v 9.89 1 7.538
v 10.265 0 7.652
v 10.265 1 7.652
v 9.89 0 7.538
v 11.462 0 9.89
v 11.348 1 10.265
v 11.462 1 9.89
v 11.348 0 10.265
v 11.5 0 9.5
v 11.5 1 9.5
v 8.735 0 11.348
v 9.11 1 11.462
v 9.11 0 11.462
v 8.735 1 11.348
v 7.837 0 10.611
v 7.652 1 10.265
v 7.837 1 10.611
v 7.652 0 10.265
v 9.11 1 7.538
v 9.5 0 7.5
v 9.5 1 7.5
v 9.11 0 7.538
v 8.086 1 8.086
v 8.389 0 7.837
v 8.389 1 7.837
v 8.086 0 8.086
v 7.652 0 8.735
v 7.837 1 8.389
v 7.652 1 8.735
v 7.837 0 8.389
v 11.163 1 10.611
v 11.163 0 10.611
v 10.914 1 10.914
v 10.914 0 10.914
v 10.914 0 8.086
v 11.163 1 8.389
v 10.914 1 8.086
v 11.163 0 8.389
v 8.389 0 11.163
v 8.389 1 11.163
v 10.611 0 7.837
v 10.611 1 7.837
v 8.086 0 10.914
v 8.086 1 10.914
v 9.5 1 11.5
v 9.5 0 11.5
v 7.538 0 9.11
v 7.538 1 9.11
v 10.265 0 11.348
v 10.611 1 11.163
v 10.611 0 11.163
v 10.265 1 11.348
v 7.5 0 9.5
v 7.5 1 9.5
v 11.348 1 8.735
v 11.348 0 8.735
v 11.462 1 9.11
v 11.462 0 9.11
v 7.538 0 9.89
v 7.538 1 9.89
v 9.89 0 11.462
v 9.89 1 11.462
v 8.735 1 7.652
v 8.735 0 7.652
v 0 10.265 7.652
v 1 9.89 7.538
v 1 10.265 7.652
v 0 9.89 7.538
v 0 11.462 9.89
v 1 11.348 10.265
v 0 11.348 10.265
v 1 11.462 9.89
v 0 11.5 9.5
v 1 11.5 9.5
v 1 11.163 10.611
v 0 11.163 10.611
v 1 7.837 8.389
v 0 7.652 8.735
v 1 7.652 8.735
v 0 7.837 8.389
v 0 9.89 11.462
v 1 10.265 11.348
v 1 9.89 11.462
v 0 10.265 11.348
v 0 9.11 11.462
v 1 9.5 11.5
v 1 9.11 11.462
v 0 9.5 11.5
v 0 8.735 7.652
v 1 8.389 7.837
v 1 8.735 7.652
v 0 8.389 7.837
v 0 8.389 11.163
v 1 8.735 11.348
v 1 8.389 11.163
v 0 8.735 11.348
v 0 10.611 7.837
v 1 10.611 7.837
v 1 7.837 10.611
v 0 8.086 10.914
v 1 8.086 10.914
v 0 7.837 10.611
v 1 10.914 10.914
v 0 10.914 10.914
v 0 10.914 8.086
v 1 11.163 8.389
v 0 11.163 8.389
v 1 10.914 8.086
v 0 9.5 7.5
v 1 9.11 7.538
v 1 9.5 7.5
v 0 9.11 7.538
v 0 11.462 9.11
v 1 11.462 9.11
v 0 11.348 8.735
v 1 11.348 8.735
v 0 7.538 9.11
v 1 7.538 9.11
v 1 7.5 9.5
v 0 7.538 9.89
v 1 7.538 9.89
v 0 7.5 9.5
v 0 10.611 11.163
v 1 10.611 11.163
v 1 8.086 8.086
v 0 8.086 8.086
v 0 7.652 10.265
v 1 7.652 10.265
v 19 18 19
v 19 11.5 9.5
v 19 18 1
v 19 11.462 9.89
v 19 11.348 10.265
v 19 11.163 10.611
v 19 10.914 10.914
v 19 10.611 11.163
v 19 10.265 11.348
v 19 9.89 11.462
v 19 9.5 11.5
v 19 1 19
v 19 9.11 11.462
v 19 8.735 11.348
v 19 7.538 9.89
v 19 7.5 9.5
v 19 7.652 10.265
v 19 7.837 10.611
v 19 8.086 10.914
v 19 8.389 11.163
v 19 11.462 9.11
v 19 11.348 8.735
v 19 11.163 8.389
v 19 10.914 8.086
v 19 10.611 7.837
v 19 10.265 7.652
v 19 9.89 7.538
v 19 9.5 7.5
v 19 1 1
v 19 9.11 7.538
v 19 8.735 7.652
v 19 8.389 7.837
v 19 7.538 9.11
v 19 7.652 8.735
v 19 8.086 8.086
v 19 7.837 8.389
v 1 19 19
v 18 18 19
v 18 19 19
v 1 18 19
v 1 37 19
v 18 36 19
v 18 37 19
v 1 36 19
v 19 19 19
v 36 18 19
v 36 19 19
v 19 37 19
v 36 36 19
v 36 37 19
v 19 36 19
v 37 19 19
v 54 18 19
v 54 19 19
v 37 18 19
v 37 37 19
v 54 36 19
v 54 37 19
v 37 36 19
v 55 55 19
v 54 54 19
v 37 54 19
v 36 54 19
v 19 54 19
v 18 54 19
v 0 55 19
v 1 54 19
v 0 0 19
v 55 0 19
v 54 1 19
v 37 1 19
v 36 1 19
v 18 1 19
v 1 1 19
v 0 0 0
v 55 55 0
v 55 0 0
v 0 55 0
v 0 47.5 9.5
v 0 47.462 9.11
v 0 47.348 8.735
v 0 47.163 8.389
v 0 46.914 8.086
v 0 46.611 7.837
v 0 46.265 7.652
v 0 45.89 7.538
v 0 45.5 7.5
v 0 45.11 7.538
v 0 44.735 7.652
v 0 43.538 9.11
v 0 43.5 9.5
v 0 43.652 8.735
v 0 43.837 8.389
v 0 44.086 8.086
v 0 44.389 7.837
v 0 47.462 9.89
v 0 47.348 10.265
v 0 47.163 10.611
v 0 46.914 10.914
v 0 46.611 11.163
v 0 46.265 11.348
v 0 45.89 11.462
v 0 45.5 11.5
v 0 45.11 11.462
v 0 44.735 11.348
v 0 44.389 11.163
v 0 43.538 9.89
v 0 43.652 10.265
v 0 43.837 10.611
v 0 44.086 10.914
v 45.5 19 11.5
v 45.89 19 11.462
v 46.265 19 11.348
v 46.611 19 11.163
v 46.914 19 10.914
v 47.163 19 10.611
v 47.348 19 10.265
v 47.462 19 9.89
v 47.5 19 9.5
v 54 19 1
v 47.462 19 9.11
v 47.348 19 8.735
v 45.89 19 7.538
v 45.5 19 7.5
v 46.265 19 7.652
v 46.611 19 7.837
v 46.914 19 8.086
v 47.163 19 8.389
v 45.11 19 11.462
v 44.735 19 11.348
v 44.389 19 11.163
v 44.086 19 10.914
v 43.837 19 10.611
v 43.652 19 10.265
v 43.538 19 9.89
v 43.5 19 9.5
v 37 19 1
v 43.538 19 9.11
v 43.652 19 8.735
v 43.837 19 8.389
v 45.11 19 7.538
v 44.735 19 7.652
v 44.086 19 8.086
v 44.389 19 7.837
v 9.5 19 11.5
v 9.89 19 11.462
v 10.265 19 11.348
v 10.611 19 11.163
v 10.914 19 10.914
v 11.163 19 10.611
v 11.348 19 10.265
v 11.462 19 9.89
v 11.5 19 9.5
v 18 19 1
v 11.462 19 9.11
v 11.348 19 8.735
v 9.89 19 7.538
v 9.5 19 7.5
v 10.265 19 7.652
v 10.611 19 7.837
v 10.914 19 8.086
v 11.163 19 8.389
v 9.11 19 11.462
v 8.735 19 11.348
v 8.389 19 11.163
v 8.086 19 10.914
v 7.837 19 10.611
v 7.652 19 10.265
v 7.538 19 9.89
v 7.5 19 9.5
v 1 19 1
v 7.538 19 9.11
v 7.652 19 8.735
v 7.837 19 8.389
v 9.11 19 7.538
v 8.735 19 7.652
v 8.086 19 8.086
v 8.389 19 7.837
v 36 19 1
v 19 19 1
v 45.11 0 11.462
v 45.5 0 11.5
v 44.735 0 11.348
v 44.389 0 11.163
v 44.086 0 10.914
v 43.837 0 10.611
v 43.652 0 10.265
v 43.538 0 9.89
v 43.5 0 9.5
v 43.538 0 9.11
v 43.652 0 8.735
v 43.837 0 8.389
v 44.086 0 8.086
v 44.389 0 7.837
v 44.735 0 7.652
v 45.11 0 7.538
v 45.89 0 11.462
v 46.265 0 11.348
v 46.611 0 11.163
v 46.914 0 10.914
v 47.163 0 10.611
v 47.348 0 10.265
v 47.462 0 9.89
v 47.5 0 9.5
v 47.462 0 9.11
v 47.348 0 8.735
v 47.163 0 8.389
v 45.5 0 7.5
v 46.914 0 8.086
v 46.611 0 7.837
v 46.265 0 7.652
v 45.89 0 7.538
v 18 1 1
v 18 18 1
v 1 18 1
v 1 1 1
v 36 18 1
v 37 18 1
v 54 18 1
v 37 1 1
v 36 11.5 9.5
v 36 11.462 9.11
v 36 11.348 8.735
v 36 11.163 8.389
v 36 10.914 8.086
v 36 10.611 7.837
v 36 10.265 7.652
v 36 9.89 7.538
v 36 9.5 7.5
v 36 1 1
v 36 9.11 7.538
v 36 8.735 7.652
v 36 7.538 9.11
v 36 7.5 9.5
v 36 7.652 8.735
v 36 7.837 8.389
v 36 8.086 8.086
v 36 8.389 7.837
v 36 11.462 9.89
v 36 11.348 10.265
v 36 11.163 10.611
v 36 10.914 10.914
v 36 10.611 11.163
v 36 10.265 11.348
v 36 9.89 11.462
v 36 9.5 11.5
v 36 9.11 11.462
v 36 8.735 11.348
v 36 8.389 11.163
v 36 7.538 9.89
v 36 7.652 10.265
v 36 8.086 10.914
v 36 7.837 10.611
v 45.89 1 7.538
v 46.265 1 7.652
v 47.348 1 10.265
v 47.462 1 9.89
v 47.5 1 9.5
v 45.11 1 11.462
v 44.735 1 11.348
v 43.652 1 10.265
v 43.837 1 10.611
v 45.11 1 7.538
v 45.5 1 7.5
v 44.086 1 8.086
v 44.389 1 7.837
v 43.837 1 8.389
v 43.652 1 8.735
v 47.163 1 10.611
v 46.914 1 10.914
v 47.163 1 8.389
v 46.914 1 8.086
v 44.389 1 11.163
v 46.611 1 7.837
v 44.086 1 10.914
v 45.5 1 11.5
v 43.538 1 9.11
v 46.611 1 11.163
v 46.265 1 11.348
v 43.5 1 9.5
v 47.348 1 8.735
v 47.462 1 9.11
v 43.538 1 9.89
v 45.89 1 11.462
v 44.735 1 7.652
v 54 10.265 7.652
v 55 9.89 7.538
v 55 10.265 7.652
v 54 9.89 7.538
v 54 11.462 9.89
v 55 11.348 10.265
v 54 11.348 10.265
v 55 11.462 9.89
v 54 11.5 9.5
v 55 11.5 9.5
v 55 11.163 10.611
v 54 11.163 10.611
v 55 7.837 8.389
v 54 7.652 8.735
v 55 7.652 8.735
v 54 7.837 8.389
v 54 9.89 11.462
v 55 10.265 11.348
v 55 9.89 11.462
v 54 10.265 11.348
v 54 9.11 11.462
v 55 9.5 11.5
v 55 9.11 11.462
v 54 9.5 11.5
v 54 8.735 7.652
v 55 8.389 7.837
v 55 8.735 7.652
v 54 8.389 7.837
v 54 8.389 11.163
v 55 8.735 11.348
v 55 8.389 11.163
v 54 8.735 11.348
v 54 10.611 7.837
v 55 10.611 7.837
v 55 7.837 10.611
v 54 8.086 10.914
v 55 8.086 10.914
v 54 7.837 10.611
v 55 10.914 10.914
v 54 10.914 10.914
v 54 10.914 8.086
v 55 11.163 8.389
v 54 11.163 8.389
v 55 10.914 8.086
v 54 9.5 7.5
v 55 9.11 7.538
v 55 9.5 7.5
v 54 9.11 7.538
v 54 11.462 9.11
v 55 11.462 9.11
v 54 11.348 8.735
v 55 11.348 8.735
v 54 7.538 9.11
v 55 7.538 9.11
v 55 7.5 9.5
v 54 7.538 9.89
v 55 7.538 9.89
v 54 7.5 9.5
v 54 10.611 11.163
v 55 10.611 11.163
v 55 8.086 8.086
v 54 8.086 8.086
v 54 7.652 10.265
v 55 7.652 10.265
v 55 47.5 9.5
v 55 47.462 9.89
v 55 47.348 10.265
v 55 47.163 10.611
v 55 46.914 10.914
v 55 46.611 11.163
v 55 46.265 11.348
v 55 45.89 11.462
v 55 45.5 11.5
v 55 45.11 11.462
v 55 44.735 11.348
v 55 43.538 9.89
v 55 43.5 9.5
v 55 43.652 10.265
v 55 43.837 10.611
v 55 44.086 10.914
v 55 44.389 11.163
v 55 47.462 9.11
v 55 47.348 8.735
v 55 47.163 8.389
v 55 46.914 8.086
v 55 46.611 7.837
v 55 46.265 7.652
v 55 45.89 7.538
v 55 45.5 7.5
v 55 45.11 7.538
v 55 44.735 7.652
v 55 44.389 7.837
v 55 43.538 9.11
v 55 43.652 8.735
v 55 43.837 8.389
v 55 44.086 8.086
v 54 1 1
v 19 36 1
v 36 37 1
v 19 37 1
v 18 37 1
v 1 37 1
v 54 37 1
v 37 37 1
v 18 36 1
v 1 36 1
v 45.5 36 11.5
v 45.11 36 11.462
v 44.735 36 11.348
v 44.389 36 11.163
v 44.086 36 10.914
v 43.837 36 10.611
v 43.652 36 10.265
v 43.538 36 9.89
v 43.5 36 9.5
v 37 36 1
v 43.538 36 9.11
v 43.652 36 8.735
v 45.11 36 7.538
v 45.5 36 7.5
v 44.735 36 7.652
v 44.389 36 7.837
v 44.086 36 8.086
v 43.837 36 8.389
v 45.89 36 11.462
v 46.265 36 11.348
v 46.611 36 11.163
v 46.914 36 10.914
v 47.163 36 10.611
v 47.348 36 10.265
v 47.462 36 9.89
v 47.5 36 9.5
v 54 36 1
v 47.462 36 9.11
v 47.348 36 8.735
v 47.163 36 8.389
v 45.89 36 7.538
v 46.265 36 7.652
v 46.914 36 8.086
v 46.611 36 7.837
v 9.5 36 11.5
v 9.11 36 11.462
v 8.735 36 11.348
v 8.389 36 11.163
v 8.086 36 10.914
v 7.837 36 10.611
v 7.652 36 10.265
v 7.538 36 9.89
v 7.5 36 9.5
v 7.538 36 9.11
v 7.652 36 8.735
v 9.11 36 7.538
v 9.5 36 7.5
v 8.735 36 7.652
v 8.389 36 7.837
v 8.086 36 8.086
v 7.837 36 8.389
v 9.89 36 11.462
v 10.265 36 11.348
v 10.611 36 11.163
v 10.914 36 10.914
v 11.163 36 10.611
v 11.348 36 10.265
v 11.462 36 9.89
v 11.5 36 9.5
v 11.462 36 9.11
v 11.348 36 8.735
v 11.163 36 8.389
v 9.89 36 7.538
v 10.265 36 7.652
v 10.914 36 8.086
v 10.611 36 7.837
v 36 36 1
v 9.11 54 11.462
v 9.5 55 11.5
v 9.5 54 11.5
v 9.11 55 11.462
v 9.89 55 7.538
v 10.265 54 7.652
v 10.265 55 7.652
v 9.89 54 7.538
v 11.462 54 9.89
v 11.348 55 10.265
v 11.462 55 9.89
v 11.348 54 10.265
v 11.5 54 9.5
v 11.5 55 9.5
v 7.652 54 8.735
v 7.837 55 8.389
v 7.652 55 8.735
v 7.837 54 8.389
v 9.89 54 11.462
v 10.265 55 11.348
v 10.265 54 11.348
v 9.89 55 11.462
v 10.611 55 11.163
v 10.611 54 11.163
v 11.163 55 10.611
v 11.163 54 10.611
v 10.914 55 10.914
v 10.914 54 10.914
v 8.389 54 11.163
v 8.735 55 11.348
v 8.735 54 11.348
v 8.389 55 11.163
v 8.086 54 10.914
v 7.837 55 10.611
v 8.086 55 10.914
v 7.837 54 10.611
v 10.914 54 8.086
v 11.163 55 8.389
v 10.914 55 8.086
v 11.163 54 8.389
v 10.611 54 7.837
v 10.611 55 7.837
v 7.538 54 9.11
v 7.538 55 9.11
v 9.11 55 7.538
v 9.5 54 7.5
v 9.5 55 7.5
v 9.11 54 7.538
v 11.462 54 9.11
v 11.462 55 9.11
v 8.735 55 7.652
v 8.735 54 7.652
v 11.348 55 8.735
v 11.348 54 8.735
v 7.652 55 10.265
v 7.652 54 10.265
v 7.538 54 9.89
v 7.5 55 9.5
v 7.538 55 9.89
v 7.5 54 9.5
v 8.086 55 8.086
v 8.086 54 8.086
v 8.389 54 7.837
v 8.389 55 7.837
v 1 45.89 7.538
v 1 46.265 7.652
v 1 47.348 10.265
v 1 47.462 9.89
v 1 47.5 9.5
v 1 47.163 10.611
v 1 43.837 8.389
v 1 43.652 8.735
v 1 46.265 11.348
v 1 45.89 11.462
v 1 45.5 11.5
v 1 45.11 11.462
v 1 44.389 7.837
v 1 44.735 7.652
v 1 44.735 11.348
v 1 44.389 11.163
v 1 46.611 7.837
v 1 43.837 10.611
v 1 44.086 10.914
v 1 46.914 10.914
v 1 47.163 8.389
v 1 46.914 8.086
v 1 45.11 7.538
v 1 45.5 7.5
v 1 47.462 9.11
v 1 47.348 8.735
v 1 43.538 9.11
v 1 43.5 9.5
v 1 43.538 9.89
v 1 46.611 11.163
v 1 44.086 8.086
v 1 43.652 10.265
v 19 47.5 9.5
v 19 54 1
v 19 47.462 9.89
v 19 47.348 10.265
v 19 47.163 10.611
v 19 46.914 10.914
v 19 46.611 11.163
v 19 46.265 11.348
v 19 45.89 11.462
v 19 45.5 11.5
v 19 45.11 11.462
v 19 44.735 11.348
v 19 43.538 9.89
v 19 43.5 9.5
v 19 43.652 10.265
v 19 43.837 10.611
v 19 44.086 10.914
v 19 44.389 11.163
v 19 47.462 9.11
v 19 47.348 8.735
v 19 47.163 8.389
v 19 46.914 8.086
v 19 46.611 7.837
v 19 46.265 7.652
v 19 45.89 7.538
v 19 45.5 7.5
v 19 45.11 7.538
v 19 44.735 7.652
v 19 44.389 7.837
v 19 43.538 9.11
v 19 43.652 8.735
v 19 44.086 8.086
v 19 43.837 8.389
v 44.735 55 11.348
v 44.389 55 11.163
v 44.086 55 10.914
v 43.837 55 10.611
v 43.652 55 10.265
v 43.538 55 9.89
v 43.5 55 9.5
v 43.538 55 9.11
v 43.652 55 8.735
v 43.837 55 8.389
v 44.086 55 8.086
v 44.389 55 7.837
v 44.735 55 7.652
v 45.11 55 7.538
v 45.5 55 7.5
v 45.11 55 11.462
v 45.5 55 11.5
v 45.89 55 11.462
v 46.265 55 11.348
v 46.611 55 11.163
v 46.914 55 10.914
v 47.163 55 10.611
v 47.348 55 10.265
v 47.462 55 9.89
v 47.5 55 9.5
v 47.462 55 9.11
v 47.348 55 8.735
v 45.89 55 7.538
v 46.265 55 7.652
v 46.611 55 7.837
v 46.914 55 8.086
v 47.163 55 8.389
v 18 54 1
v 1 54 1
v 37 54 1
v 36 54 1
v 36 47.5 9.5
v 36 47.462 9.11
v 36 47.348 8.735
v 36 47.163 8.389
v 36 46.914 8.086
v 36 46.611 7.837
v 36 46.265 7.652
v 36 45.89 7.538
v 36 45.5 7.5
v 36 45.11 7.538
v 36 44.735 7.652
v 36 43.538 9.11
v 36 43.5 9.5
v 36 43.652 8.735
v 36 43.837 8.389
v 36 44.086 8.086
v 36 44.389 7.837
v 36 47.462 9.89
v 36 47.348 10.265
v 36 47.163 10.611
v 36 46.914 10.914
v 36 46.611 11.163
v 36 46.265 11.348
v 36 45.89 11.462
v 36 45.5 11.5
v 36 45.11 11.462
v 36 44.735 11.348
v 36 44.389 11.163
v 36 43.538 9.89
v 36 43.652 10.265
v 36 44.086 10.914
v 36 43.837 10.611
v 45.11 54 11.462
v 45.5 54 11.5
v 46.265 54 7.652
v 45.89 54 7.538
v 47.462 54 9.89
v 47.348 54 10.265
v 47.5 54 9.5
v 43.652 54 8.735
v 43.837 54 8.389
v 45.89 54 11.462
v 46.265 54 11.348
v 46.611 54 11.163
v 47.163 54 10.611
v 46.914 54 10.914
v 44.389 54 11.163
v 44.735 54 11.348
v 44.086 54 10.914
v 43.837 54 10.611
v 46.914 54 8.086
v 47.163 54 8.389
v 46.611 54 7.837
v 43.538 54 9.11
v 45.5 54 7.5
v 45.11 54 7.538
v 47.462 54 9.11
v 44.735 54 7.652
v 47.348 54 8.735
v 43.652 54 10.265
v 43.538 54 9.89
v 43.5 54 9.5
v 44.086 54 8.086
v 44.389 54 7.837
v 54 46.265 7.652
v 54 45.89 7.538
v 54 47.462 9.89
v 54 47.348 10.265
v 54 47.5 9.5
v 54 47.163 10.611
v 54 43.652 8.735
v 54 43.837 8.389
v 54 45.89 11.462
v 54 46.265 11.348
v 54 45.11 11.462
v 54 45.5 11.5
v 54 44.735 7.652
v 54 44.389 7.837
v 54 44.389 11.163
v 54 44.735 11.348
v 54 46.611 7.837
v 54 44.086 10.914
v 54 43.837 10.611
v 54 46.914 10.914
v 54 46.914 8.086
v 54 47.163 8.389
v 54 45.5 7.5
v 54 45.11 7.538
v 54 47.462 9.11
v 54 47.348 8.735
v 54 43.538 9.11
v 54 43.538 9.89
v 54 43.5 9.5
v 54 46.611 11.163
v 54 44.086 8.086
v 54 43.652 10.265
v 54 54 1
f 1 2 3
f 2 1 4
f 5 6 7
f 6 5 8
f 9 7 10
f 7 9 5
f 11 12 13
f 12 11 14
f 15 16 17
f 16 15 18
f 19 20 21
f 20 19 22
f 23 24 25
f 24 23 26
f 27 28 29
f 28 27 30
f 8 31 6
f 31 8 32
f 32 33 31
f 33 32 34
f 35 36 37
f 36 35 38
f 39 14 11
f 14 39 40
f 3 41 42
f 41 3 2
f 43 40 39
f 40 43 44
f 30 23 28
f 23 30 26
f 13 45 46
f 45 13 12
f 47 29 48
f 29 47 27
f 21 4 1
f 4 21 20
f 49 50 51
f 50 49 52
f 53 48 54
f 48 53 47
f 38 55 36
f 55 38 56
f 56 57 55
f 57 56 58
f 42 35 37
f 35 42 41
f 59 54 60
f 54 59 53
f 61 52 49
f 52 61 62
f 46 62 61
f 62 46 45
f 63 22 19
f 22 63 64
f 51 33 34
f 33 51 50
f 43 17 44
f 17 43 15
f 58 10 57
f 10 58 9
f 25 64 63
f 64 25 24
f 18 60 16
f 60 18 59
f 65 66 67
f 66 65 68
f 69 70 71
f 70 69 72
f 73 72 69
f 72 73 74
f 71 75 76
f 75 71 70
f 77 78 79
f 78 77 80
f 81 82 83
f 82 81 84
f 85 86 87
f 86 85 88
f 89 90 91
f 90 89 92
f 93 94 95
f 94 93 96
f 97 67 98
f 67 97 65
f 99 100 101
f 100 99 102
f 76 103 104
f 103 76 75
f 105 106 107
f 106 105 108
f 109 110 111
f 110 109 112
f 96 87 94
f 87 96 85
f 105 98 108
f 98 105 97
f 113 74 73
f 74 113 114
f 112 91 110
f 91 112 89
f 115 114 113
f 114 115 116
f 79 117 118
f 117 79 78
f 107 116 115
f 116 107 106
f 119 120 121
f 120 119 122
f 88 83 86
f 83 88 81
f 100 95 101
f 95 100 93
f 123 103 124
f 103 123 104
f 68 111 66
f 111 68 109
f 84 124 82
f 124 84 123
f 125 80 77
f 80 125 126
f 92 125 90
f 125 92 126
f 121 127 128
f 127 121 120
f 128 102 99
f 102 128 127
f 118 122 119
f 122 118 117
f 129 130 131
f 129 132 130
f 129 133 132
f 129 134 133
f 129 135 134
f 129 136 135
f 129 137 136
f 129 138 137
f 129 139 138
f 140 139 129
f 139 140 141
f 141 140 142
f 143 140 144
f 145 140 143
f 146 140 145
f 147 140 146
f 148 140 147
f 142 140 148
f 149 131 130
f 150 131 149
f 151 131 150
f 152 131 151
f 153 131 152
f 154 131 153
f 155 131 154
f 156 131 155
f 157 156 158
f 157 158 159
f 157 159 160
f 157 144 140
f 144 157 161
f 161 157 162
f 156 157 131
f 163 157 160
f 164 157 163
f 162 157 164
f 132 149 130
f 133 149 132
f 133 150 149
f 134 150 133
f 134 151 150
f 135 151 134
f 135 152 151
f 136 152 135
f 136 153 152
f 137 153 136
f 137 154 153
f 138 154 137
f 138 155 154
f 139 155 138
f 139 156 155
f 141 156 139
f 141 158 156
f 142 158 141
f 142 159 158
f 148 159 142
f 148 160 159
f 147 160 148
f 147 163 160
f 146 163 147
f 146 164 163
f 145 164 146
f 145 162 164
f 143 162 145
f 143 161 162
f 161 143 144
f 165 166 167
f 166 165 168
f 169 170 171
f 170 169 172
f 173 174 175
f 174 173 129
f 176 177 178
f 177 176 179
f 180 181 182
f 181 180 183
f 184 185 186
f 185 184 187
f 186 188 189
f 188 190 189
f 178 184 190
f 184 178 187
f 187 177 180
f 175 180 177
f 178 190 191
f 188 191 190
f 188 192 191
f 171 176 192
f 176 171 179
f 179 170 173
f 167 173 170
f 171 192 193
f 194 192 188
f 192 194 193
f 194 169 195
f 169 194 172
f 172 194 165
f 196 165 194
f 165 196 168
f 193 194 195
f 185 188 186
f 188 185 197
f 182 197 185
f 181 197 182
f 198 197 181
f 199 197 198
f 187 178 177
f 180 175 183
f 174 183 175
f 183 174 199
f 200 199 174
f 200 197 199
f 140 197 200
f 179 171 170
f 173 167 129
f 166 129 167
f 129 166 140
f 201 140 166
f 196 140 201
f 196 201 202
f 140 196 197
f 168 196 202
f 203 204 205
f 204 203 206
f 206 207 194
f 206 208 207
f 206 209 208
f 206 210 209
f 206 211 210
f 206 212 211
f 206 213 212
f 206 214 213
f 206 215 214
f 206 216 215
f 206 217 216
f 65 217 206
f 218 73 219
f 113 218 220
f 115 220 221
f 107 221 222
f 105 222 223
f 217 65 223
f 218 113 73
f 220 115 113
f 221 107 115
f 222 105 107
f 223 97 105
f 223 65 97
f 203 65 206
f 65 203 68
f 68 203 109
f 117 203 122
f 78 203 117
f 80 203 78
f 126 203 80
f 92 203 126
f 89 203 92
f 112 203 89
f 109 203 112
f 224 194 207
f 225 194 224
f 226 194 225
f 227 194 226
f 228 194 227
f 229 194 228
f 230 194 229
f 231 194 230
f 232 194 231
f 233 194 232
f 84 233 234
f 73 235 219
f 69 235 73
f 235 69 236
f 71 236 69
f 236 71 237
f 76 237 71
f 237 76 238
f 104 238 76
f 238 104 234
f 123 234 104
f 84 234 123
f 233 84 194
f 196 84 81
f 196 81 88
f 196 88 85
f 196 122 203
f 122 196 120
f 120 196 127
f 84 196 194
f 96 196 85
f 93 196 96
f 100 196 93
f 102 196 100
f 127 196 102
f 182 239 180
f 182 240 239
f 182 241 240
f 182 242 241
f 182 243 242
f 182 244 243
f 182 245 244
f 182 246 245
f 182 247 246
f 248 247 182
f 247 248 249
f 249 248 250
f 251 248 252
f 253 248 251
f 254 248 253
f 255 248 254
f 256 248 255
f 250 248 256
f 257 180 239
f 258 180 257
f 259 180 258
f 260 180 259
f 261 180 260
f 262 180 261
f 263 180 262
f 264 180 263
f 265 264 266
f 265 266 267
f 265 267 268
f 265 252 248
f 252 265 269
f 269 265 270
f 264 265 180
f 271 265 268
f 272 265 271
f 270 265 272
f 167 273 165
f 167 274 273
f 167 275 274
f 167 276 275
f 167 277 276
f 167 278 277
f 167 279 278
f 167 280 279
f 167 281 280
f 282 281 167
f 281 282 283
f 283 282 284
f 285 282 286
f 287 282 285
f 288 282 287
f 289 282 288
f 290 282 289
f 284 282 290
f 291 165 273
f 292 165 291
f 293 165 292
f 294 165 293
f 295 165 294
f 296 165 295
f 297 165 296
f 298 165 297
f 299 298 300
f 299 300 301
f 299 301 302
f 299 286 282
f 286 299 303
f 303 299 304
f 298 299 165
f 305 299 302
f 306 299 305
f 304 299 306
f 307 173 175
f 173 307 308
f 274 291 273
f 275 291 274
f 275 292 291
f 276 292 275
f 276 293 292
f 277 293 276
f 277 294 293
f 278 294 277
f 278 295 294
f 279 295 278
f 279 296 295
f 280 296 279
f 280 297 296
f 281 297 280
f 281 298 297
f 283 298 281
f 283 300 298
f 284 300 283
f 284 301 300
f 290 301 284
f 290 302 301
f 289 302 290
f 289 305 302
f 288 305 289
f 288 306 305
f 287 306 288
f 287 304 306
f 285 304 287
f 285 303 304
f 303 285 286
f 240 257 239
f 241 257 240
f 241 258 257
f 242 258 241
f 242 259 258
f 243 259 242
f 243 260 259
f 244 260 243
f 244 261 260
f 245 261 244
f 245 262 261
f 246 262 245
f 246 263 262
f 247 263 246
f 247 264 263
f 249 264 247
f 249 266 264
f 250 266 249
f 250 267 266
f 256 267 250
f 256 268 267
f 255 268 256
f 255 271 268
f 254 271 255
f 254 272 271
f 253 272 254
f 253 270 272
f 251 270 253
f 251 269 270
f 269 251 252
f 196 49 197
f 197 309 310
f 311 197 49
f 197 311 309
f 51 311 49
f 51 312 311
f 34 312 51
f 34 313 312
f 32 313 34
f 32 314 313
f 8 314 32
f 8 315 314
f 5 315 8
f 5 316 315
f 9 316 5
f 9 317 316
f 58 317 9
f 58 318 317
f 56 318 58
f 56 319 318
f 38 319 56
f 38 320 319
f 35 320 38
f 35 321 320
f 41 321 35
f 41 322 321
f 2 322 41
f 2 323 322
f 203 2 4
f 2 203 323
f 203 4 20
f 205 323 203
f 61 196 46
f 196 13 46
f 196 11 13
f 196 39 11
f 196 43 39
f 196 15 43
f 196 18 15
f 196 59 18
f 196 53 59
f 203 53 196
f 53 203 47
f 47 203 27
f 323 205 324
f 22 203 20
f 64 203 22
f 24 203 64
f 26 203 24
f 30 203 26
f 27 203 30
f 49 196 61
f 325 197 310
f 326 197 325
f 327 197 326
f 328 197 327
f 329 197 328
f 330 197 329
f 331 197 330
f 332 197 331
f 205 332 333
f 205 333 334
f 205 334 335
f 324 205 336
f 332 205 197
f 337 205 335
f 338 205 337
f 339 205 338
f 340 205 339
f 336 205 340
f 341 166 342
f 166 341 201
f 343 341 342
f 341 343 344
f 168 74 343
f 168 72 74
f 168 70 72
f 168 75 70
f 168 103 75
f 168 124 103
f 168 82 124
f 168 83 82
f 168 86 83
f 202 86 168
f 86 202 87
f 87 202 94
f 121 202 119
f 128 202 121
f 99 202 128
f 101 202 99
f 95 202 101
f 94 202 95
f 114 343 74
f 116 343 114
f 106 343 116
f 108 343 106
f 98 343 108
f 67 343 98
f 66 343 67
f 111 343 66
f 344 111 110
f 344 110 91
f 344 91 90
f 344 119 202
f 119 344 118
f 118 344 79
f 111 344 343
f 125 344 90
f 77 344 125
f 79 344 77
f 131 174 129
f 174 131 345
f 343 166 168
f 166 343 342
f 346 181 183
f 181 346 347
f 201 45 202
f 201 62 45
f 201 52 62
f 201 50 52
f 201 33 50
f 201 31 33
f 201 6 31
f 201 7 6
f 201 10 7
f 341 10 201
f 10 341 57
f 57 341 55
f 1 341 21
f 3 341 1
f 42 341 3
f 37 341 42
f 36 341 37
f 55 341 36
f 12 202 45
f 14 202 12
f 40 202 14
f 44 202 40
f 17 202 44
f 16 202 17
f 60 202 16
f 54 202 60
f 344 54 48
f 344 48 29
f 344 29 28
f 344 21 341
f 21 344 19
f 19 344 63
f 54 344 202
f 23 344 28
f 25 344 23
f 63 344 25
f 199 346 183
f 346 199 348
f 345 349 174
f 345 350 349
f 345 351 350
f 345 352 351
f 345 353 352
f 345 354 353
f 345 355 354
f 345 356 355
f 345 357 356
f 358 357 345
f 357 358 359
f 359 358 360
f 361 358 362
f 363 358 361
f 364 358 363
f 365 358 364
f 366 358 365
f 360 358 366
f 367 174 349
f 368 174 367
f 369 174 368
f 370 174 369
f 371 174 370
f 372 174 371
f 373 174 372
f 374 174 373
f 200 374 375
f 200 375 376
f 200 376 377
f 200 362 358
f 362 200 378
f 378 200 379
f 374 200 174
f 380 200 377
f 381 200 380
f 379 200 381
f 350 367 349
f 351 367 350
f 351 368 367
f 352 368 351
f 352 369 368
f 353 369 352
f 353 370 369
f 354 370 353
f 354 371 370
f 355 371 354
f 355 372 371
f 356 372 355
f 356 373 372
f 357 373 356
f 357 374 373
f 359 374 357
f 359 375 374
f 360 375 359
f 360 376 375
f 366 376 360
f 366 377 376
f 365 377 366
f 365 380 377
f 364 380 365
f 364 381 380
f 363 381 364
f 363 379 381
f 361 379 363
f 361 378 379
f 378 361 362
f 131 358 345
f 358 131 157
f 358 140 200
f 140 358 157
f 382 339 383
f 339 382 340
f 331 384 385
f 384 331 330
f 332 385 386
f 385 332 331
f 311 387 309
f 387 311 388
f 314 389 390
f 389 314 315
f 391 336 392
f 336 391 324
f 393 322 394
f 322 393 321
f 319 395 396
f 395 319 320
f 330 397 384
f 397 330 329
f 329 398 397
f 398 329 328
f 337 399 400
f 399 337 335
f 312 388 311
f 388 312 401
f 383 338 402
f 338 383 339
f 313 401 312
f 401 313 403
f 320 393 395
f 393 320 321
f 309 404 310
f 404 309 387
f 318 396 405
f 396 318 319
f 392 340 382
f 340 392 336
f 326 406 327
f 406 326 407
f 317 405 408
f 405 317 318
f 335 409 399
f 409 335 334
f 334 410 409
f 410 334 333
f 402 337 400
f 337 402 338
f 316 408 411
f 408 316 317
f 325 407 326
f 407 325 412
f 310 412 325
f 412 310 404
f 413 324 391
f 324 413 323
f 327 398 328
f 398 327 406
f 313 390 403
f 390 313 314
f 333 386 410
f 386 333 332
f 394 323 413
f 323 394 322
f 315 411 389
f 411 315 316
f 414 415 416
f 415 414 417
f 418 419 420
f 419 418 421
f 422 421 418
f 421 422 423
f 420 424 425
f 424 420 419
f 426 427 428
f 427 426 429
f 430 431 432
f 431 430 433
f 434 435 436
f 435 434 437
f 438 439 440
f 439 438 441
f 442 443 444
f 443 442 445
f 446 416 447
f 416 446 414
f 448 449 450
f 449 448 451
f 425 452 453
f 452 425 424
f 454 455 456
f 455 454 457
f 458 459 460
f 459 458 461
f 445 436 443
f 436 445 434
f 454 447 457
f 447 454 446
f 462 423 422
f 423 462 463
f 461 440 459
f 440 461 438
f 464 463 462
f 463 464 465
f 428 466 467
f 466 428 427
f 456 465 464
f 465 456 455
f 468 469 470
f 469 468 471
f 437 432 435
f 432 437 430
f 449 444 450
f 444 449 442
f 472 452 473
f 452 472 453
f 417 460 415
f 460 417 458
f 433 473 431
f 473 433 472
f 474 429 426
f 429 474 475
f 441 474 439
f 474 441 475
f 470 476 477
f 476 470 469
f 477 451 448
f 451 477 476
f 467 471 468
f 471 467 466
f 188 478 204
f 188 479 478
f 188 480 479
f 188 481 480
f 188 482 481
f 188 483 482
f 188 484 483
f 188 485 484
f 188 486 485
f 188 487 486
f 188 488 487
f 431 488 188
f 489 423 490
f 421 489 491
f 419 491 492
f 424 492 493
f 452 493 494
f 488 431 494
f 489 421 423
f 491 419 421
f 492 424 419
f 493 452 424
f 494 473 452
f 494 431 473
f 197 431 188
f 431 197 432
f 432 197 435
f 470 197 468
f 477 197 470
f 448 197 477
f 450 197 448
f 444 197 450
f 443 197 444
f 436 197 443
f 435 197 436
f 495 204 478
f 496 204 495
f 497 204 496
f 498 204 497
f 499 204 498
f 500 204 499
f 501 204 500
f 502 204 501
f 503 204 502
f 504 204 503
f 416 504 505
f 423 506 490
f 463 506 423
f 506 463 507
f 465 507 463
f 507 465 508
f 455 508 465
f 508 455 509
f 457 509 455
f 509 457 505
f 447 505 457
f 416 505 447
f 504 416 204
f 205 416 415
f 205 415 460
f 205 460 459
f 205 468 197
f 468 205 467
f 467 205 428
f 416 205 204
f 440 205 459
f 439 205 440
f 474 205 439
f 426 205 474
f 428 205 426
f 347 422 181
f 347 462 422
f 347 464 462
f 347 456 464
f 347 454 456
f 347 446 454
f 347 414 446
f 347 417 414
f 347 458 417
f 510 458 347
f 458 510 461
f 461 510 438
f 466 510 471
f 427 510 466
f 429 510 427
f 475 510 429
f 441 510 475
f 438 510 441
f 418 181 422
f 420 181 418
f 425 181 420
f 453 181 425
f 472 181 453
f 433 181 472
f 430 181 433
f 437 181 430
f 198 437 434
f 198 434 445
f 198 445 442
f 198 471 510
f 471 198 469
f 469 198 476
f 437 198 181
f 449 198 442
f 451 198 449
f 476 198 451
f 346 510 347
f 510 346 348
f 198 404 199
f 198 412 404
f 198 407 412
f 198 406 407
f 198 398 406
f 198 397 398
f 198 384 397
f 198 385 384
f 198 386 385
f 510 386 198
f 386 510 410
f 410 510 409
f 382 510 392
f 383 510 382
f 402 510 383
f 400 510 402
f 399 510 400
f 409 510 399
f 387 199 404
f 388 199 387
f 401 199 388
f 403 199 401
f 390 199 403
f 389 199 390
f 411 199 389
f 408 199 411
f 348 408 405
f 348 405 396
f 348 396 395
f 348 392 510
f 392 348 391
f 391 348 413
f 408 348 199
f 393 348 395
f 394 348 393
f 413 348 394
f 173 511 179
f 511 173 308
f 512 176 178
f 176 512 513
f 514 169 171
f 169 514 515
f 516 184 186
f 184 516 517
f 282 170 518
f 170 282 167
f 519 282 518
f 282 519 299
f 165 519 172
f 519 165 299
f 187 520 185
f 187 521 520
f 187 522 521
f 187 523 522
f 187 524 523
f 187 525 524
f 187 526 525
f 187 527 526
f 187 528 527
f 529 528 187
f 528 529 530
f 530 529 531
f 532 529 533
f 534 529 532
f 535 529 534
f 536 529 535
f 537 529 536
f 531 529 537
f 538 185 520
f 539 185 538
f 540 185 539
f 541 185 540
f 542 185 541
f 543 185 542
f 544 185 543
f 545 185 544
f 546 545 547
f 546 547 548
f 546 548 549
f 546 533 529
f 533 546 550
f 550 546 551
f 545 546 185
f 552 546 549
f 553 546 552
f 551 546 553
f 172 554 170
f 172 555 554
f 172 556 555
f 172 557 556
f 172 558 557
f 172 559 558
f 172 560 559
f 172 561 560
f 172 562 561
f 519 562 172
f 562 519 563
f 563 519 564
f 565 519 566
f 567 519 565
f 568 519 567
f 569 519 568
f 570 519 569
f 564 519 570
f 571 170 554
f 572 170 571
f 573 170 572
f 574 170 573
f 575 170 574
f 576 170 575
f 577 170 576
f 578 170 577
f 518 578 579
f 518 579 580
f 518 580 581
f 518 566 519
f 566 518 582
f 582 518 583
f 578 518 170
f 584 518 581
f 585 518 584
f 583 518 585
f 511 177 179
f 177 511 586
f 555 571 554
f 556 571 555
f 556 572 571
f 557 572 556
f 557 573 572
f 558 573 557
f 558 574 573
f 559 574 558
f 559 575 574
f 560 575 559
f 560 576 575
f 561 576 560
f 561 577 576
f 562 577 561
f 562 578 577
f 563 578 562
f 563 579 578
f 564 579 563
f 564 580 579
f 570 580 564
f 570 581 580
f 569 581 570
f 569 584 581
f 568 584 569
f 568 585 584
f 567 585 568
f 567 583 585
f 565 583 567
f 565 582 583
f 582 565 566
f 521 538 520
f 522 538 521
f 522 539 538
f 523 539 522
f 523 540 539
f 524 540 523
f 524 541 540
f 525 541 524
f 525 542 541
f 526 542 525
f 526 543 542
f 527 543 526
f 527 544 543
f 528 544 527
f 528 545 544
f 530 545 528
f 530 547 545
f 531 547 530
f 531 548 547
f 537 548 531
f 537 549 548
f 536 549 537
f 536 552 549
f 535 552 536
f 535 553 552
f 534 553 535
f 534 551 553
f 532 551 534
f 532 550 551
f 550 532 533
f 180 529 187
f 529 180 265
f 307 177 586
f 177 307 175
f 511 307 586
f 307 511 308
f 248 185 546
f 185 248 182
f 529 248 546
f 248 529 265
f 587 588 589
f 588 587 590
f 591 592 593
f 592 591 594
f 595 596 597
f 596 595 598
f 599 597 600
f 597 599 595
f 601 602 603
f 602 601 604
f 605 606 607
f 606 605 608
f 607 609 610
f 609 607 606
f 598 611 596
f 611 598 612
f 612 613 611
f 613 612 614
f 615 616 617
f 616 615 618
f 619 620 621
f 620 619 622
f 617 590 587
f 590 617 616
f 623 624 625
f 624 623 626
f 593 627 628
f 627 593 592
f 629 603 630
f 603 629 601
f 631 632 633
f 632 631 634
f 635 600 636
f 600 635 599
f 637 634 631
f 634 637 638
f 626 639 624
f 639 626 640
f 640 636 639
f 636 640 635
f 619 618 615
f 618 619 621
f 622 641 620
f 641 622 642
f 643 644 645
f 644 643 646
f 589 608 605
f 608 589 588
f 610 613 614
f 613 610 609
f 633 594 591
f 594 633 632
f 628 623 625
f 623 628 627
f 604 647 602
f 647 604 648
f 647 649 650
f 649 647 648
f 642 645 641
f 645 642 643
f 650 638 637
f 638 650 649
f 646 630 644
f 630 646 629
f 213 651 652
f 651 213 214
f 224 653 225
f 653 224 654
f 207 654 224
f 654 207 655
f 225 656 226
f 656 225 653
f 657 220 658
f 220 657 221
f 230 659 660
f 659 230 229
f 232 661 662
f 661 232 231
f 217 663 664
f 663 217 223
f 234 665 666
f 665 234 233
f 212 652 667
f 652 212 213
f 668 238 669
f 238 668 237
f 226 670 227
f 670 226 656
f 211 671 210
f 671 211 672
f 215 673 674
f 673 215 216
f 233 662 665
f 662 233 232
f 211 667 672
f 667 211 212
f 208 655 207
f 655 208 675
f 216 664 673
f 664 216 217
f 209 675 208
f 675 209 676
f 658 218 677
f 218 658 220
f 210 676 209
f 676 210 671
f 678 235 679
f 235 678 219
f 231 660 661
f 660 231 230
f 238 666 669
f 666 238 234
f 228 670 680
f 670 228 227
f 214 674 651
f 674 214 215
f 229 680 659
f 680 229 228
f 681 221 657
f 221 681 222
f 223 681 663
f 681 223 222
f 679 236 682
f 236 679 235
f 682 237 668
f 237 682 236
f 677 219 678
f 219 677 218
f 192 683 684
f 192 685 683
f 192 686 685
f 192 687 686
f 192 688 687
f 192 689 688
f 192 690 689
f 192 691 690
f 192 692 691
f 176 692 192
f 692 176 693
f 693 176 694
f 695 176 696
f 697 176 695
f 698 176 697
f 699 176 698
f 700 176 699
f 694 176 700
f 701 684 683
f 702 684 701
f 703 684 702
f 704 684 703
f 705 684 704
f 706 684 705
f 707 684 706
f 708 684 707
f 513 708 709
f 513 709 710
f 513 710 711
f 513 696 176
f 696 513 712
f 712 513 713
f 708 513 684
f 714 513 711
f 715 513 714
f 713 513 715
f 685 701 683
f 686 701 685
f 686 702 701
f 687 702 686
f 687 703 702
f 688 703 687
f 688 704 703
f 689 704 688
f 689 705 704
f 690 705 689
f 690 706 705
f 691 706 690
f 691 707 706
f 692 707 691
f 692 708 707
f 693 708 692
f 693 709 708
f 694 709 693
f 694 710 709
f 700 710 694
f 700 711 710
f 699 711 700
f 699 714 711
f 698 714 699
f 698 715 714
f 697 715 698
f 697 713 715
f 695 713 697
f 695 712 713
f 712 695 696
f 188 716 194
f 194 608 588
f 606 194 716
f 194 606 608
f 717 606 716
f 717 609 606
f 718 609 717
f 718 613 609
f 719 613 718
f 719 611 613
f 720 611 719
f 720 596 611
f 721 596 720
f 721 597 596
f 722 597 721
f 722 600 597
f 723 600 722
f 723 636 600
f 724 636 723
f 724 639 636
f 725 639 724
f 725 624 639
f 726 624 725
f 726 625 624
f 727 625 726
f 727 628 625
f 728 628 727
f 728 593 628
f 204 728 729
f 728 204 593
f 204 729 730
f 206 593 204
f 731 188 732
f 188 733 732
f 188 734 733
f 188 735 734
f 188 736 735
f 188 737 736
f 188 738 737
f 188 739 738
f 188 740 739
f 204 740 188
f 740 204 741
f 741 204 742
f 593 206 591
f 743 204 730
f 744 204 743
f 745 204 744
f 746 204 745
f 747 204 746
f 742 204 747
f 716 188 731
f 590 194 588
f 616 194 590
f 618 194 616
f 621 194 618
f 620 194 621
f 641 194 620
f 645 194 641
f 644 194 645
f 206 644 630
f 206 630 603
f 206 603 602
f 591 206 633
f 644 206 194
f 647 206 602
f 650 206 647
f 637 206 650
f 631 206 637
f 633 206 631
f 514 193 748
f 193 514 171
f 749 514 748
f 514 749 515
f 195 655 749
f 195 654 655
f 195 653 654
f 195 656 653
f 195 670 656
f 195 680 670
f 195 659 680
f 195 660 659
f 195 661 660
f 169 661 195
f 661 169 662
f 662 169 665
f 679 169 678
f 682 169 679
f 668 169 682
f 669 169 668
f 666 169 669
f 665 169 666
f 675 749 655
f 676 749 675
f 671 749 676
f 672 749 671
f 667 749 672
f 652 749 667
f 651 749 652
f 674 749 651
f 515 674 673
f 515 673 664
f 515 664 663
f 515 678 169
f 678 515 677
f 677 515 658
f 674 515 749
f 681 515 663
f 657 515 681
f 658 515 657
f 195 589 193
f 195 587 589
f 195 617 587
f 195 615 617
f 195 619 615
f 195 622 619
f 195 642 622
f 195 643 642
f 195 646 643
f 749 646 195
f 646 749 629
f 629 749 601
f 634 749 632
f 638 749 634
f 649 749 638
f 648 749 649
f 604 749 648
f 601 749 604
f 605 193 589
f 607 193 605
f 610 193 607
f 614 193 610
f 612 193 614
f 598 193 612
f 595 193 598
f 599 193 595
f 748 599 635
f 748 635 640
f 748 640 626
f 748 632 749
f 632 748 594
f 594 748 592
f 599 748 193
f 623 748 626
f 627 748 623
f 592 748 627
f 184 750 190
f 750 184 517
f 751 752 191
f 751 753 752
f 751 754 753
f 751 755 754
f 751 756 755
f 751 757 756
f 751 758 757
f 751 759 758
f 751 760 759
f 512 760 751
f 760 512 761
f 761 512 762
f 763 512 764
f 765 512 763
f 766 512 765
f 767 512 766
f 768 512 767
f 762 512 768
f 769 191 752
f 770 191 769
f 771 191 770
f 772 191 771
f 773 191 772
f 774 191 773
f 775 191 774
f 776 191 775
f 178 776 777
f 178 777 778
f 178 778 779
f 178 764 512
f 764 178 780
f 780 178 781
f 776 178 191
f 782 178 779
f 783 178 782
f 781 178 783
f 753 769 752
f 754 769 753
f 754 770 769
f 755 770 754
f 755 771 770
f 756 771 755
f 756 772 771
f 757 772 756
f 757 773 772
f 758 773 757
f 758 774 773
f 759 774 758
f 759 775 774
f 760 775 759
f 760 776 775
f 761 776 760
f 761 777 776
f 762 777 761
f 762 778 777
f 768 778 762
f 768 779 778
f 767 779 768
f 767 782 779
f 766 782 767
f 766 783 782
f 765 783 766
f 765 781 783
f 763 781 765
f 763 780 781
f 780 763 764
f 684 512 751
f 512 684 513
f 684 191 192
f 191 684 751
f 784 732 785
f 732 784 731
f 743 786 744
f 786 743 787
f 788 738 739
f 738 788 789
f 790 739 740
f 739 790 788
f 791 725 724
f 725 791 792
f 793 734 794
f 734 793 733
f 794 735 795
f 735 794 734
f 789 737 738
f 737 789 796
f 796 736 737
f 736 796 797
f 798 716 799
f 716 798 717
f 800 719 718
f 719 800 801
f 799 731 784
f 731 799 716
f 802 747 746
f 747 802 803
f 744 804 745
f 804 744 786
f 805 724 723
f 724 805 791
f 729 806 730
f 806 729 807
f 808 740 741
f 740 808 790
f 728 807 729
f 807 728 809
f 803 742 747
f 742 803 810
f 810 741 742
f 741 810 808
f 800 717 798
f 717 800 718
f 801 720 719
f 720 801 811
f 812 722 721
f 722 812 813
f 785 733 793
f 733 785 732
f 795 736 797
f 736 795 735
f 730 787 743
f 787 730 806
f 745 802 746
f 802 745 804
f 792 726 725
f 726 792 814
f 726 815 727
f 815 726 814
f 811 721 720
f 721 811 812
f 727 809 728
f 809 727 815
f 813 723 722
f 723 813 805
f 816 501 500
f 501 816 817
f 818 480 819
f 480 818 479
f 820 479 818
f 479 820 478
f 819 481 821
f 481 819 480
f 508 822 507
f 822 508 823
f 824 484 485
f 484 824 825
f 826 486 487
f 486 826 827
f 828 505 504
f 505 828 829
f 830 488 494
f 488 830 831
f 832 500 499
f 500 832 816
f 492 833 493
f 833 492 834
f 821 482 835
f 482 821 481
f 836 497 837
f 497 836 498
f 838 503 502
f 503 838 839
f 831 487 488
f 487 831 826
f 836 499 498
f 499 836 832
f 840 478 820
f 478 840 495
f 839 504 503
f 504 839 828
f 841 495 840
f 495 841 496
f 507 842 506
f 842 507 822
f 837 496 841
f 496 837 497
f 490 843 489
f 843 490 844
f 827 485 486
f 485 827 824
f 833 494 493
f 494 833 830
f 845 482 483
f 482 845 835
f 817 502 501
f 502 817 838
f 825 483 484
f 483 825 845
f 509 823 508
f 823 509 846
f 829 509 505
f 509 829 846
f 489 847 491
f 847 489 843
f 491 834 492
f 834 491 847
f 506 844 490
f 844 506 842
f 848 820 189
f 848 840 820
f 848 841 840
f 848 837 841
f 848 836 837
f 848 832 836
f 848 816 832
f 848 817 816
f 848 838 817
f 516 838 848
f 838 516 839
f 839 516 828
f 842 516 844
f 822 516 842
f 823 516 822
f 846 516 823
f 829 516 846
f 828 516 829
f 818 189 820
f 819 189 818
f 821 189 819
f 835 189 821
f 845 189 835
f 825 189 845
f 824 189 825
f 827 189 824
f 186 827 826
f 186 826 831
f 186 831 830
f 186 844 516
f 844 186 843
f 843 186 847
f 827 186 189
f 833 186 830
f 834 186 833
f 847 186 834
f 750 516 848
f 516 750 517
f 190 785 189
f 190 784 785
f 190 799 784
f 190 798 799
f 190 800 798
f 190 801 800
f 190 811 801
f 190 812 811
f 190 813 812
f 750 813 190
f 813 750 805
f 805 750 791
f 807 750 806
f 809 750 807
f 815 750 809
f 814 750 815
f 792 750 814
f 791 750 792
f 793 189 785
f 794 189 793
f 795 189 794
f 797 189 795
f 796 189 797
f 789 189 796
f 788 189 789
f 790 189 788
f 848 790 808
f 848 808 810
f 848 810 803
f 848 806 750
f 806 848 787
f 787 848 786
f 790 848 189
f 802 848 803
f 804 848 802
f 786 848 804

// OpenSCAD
//CUSTOMIZER VARIABLES


//	Number of cubes across the x axis
number_across = 3;              // [3:10]
//	Number of cubes across the y axis
number_deep = 3;                // [3:10]

//Set to true for a middle layer
have_middle_layer = false;      
//The text for the first pillar
theText = "Pens"; 
show_top = "no";	    //	[yes,no]
show_bottom = "yes";	//	[yes,no]
show_bl_pillar = "no";	//	[yes,no]
show_br_pillar = "no";	//	[yes,no]
show_tl_pillar = "no";	//	[yes,no]
show_tr_pillar = "no";	//	[yes,no]

//CUSTOMIZER VARIABLES END
/* [Hidden] */
cube_external_size = 19;        
wall_thickness = 1;            
pillar_height=110;
joining_pin_size = 2;           
cube_internal_size = cube_external_size - (wall_thickness*2);


if (show_top=="yes")    
    top_tray();
if (show_bottom=="yes")
    bottom_tray();

font1 = "Liberation Sans"; // here you can select other font type

//bottom left pillar
if (show_bl_pillar=="yes"){
    difference(){
        pillar(have_middle_layer);
        
        translate([13,0,20]){
            rotate([90,-90,0]){ 
                font="Liberation Sans:style=Bold Italic";
                linear_extrude(200) {
                    text(theText, font = font1, size = 7, direction = "ltr", spacing = 1 );
                }
            }
        }
    }
}

//bottom right pillar
if (show_br_pillar=="yes"){
    translate([(number_across*cube_external_size)-(number_across-1),0,0]){
        rotate([0,0,90]){
            pillar(have_middle_layer);
        }
    }
}

//top left pillar
if (show_tl_pillar=="yes"){
    translate([0,(number_deep*cube_external_size)-(number_deep-1),0]){
        rotate([0,0,-90]){
            pillar(have_middle_layer);
        }
    }
}

//top right pillar
if (show_tr_pillar=="yes"){
    translate([(number_across*cube_external_size)-(number_across-1),(number_deep*cube_external_size)-(number_deep-1),0]){
        rotate([0,0,180]){
            pillar(have_middle_layer);
        }
    }
}

//joining pin front
module joining_pin_front(){
    translate([cube_external_size/2,2,cube_external_size/2]){
        rotate([90,0,0]){
            cylinder(2,joining_pin_size-.2,joining_pin_size-.2,$fn=32);
        }
    }
}

//joining pin side
module joining_pin_side(){
    translate([0,cube_external_size/2,cube_external_size/2]){
        rotate([90,0,90]){
           cylinder(2,joining_pin_size-.2,joining_pin_size-.2,$fn=32);
        }
    }
}


//Show the object dimensions
echo("<h1>Dimensions of object</h1>");
echo("x=",cube_external_size*number_across,"mm");
echo("y=",cube_external_size*number_deep,"mm");
echo("z=",pillar_height,"mm");

module bottom_tray(){
        for (y=[0:number_deep-1])
        for (x=[0:number_across-1])
            translate([x*(cube_internal_size+1),y*(cube_internal_size+1),0])
                bottom_tray_cube(x,y);

}

module top_tray(){
        for (y=[0:number_deep-1])
            for (x=[0:number_across-1])
                translate([x*(cube_internal_size+1),y*(cube_internal_size+1),pillar_height-cube_external_size/2])
                    top_tray_cube(x,y);
        
}

module bottom_tray_cube(x,y){
    difference() {
        cube([cube_external_size,cube_external_size,cube_external_size]);

        translate([1,1,1]) {
            cube([cube_internal_size,cube_internal_size,cube_internal_size+2]);
        }
        
        if((x==0 && y==0) || (x==number_across-1 && y==number_deep-1)||((x==0)&&(y==number_deep-1))||((x==number_across-1)&&(y==0))){
            translate([cube_external_size/2,2,cube_external_size/2]) {
                rotate([90,0,0]){
                    cylinder(3,joining_pin_size,joining_pin_size,$fn=32);
                }
            }

            translate([cube_external_size/2,cube_external_size+1,cube_external_size/2]) {
                rotate([90,0,0]){
                    cylinder(3,joining_pin_size,joining_pin_size,$fn=32);
                }
            }
     
            translate([-1,cube_external_size/2,cube_external_size/2]) {
                rotate([90,0,90]){
                    cylinder(3,joining_pin_size,joining_pin_size,$fn=32);
                }
            }
            translate([cube_external_size-2,cube_external_size/2,cube_external_size/2]) {
                rotate([90,0,90]){
                    cylinder(3,joining_pin_size,joining_pin_size,$fn=32);
                }
            }
        }
    }
}

module top_tray_cube(x,y){
    difference() {
        cube([cube_external_size,cube_external_size,cube_external_size/2]);
     
        translate([1,1,-1]) {
            cube([cube_internal_size,cube_internal_size,cube_internal_size+4]);
        }
        if((x==0 && y==0) || (x==number_across-1 && y==number_deep-1)||((x==0)&&(y==number_deep-1))||((x==number_across-1)&&(y==0))){
            translate([cube_external_size/2,2,cube_external_size/4]) {
                rotate([90,0,0]){
                    cylinder(3,joining_pin_size,joining_pin_size,$fn=32);
                }
            }

            translate([cube_external_size/2,cube_external_size+1,cube_external_size/4]) {
                rotate([90,0,0]){
                    cylinder(3,joining_pin_size,joining_pin_size,$fn=32);
                }
            }
     
            translate([-1,cube_external_size/2,cube_external_size/4]) {
                rotate([90,0,90]){
                    cylinder(3,joining_pin_size,joining_pin_size,$fn=32);
                }
            }
            translate([cube_external_size-2,cube_external_size/2,cube_external_size/4]) {
                rotate([90,0,90]){
                    cylinder(3,joining_pin_size,joining_pin_size,$fn=32);
                }
            }
        }
    }
}

module pillar(middle_tray){
    union(){
        difference(){
            translate([-1,-1,0]){
                union(){
                    cube ([cube_external_size+1,2,pillar_height]);
                    cube ([2,cube_external_size+1,pillar_height]);

                }
            }
            //bottom cutout
            translate([0,0,-1]){
                cube([cube_external_size,cube_external_size,cube_external_size+1]);
            }
            
            if(middle_tray){
                //middle cutout
                translate([0,0,pillar_height/2]){
                    cube([cube_external_size,cube_external_size,cube_external_size/2+1]);
                    top_tray();
                }
            }
            
            //top cutout
            translate([0,0,pillar_height-cube_external_size/2]){
                cube([cube_external_size,cube_external_size,cube_external_size/2+1]);
            }
        }
        
        joining_pin_front();
        translate([.1,0,pillar_height-cube_external_size+5]){
            joining_pin_front();
        }
        
        joining_pin_side();
        translate([0,.1,pillar_height-cube_external_size+5]){
            joining_pin_side();
        }
        
        if (middle_tray){
            translate([0,0,(pillar_height/2)-4]){
                joining_pin_front();
                joining_pin_side();
                
            }
        }
    }
}
